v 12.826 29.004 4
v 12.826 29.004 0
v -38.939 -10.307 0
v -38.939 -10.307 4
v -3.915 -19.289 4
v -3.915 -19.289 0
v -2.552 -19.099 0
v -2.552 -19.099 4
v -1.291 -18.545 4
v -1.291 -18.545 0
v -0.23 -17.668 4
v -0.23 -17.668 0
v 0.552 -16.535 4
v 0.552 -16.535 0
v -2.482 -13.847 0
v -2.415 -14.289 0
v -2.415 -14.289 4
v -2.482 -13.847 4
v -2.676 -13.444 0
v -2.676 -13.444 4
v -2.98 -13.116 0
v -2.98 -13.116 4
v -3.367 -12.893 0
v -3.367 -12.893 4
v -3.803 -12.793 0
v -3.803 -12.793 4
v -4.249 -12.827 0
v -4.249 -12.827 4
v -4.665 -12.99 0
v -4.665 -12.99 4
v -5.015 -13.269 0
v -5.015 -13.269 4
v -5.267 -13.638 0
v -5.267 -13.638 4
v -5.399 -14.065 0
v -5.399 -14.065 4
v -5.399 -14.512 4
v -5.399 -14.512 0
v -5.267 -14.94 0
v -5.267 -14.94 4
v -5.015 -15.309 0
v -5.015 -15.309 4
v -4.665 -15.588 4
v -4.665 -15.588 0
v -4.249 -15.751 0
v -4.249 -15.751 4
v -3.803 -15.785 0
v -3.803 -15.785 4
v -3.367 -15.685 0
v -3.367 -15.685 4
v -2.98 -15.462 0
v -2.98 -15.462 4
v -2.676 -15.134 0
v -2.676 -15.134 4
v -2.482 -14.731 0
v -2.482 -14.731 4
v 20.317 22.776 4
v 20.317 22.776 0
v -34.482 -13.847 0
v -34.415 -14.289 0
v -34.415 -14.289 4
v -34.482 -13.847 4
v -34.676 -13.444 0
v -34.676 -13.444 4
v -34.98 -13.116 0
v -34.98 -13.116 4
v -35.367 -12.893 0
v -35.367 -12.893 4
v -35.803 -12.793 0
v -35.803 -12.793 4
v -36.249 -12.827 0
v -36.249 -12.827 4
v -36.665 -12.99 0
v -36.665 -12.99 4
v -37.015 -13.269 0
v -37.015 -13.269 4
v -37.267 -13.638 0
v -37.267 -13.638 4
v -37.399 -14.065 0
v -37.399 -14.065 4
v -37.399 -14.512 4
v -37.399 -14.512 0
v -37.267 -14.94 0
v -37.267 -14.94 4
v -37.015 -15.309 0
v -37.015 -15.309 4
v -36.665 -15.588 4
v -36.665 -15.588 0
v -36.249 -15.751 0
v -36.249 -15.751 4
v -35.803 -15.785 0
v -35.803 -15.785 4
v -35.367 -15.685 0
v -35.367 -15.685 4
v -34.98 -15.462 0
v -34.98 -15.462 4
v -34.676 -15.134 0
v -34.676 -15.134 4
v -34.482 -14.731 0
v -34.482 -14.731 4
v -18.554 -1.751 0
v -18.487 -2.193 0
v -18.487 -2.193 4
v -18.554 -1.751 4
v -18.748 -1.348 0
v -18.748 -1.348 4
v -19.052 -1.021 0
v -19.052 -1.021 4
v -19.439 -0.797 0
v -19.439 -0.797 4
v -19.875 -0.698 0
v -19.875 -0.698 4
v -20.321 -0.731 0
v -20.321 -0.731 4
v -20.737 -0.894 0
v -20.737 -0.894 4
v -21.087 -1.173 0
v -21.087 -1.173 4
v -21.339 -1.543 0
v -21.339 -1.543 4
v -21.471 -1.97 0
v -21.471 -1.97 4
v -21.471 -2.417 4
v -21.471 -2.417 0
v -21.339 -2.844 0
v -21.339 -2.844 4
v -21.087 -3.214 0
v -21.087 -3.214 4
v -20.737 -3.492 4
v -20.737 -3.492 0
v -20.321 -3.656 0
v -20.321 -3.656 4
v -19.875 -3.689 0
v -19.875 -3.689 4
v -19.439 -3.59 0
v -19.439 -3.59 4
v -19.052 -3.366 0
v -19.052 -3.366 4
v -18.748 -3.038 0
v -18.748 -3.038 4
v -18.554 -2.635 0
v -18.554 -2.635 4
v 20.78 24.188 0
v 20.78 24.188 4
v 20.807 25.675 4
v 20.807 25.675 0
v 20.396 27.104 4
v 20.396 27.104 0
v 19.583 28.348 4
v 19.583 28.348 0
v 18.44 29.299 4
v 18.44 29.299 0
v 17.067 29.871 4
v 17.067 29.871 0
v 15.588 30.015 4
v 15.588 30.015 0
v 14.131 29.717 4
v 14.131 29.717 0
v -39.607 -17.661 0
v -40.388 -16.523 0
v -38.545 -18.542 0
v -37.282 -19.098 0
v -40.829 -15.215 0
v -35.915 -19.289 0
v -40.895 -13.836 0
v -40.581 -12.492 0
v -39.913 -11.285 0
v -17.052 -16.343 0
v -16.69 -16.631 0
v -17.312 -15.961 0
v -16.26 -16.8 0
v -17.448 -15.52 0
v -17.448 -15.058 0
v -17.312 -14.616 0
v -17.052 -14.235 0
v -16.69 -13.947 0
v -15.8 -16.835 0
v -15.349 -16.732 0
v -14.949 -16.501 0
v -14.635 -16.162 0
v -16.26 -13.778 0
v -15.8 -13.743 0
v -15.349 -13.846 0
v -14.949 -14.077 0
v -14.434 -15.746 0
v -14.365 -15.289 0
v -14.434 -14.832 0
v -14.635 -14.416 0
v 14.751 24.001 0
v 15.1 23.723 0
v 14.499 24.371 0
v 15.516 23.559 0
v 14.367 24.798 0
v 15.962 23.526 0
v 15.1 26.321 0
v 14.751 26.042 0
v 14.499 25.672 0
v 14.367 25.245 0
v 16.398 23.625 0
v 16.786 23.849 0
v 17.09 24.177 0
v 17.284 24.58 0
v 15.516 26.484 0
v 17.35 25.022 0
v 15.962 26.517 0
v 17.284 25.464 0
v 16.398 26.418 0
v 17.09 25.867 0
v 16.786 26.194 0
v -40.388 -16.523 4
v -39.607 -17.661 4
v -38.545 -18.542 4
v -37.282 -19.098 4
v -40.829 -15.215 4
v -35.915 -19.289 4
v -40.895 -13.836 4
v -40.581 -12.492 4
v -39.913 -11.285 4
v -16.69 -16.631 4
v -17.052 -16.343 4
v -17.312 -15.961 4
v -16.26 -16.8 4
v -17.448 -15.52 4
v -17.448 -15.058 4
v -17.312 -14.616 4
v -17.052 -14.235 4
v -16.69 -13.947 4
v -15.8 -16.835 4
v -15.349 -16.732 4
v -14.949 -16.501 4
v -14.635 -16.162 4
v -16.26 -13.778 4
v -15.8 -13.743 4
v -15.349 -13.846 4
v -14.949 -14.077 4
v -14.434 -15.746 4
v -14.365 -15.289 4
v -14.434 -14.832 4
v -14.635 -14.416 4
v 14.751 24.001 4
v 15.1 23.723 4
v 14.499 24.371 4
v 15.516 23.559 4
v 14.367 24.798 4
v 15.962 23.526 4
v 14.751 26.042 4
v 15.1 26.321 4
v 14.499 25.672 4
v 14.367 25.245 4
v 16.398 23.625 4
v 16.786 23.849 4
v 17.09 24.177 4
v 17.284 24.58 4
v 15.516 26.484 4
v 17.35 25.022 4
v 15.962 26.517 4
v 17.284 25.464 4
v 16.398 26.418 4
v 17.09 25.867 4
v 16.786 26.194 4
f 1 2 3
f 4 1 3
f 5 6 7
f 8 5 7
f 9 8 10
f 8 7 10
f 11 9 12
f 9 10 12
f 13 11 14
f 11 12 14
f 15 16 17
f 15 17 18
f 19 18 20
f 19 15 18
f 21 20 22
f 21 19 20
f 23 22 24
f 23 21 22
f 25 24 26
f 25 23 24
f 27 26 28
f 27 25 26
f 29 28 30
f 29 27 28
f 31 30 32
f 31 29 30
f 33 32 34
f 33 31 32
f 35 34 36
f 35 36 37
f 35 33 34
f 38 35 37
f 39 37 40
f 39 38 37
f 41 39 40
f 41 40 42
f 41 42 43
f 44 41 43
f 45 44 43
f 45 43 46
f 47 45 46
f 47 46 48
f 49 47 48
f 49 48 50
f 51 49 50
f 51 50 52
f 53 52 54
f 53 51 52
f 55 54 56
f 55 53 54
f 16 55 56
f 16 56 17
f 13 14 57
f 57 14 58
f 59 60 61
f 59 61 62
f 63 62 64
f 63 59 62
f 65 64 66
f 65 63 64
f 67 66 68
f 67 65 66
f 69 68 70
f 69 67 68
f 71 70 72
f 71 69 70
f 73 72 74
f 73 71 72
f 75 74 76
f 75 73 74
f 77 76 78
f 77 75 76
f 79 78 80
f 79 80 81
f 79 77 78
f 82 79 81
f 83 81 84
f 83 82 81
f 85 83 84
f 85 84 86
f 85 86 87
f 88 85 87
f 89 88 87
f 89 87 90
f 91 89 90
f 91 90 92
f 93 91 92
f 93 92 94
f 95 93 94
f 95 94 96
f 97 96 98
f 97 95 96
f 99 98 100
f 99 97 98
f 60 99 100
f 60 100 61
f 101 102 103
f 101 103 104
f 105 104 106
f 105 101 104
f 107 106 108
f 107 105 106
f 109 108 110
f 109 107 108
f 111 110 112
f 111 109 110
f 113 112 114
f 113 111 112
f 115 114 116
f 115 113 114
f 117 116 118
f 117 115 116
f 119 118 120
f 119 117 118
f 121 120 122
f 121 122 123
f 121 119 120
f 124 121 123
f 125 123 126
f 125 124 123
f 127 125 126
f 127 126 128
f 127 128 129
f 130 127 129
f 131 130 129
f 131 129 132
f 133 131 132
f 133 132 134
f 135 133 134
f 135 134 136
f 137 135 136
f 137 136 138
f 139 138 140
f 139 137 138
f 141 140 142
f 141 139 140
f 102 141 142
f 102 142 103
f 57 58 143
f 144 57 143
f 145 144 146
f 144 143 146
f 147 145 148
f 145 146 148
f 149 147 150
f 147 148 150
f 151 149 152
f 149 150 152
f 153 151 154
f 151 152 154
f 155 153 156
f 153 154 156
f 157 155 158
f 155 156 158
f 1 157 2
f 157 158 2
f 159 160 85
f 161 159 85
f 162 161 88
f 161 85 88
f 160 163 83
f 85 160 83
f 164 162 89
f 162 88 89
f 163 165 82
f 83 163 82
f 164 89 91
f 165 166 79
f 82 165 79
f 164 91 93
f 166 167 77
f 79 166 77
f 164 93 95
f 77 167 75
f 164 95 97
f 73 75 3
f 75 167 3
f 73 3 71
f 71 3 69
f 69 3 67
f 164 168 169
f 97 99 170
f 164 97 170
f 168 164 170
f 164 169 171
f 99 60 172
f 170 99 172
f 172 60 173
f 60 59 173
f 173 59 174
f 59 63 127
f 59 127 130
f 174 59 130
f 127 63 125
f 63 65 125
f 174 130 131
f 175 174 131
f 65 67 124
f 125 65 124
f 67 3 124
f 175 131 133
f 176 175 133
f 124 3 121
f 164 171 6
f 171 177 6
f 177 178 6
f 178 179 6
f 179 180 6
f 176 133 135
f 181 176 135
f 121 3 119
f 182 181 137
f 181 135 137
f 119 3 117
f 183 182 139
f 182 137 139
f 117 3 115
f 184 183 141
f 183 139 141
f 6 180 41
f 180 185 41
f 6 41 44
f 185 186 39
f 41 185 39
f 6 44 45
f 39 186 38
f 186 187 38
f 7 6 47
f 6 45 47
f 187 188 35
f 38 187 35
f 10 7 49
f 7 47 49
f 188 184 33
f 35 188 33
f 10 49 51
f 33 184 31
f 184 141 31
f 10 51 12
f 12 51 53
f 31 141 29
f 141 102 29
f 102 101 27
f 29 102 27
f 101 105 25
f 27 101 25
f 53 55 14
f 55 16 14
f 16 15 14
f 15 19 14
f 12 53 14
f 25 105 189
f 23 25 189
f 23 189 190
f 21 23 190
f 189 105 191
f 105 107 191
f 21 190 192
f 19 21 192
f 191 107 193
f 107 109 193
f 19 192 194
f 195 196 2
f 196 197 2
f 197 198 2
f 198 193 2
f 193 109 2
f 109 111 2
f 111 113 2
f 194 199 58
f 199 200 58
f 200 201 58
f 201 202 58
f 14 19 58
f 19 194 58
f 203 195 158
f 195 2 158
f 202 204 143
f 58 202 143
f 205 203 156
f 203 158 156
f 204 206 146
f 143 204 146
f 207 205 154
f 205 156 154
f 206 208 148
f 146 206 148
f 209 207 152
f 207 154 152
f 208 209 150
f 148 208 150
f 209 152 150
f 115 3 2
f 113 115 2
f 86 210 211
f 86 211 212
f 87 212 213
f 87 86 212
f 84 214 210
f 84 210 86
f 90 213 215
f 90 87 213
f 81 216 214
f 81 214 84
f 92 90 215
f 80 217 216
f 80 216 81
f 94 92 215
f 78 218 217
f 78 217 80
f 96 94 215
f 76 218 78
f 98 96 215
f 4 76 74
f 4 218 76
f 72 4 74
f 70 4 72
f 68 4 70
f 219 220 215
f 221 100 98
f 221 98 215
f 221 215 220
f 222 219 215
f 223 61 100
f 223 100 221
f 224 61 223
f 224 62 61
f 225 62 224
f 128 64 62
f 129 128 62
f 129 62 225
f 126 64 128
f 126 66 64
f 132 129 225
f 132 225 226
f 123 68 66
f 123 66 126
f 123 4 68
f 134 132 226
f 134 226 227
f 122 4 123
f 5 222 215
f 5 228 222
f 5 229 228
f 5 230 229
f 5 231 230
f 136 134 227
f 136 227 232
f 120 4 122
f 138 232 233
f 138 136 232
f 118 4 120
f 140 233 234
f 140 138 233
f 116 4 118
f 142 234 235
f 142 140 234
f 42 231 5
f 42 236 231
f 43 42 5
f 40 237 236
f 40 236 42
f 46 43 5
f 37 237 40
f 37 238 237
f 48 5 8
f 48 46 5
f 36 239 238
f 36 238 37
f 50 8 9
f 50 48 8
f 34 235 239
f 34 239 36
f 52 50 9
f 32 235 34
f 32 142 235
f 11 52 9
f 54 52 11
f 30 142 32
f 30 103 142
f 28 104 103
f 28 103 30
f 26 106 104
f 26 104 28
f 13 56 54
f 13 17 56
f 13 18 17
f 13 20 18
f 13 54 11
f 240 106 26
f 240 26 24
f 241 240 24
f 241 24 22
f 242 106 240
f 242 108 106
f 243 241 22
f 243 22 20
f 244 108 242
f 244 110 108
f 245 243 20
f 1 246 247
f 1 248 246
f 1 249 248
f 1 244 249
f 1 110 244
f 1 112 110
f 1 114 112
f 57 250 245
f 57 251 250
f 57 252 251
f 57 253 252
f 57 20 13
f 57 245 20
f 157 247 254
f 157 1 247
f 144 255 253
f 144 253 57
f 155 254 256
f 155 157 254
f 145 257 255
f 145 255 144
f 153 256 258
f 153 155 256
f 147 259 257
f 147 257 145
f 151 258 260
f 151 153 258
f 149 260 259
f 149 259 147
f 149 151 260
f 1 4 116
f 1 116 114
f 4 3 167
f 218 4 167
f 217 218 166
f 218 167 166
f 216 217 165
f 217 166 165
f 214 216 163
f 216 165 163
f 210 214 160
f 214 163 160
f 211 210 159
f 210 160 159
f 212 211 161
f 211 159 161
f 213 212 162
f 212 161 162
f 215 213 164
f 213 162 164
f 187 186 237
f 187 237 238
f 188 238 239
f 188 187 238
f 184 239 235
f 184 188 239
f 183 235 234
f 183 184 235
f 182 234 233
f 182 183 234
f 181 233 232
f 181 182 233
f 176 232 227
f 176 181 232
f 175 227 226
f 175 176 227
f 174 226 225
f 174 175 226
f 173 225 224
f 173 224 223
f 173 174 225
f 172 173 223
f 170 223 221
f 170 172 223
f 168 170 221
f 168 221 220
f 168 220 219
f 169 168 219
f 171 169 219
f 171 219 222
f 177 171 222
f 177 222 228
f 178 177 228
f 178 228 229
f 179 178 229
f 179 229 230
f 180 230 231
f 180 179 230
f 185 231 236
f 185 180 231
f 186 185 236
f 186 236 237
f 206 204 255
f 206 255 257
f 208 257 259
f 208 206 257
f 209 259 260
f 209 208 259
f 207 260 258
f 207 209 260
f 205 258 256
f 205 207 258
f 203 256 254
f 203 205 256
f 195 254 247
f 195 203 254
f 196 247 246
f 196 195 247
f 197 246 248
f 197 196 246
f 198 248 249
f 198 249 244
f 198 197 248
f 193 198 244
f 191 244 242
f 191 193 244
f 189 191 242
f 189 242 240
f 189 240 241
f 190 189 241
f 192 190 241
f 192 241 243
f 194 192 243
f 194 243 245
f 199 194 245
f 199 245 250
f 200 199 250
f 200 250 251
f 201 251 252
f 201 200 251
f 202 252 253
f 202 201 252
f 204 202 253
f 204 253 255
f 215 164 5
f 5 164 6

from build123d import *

# Parameters (mm, degrees)
SKETCH_1_R      = 1.5
SKETCH_1_R_2    = 1.55
EXTRUDE_1_DEPTH = 4


with BuildPart() as part:
    # 草图1 → 凸台-拉伸1 (new body)
    with BuildSketch(Plane.XY):
        with BuildLine():
            Line((12.826389613, 29.00362922), (-38.939235387, -10.306930028))
            ThreePointArc((-38.939235387, -10.306930028), (-40.654009304, -15.884229397), (-35.915346214, -19.288901182))
            Line((-35.915346214, -19.288901182), (-3.915346214, -19.288901182))
            ThreePointArc((-3.915346214, -19.288901182), (-1.291462523, -18.545100704), (0.551762792, -16.534994932))
            Line((0.551762792, -16.534994932), (20.317387792, 22.775564316))
            ThreePointArc((20.317387792, 22.775564316), (19.046826765, 28.866405264), (12.826389613, 29.00362922))
        make_face()
        with Locations((15.850278786, 25.021658066)):
            Circle(SKETCH_1_R, mode=Mode.SUBTRACT)
        with Locations((-3.915346214, -14.288901182)):
            Circle(SKETCH_1_R, mode=Mode.SUBTRACT)
        with Locations((-35.915346214, -14.288901182)):
            Circle(SKETCH_1_R, mode=Mode.SUBTRACT)
        with Locations((-19.987461598, -2.19334449)):
            Circle(SKETCH_1_R, mode=Mode.SUBTRACT)
        with Locations((-15.915346214, -15.288901182)):
            Circle(SKETCH_1_R_2, mode=Mode.SUBTRACT)
    extrude(amount=EXTRUDE_1_DEPTH)


solid = part.part
